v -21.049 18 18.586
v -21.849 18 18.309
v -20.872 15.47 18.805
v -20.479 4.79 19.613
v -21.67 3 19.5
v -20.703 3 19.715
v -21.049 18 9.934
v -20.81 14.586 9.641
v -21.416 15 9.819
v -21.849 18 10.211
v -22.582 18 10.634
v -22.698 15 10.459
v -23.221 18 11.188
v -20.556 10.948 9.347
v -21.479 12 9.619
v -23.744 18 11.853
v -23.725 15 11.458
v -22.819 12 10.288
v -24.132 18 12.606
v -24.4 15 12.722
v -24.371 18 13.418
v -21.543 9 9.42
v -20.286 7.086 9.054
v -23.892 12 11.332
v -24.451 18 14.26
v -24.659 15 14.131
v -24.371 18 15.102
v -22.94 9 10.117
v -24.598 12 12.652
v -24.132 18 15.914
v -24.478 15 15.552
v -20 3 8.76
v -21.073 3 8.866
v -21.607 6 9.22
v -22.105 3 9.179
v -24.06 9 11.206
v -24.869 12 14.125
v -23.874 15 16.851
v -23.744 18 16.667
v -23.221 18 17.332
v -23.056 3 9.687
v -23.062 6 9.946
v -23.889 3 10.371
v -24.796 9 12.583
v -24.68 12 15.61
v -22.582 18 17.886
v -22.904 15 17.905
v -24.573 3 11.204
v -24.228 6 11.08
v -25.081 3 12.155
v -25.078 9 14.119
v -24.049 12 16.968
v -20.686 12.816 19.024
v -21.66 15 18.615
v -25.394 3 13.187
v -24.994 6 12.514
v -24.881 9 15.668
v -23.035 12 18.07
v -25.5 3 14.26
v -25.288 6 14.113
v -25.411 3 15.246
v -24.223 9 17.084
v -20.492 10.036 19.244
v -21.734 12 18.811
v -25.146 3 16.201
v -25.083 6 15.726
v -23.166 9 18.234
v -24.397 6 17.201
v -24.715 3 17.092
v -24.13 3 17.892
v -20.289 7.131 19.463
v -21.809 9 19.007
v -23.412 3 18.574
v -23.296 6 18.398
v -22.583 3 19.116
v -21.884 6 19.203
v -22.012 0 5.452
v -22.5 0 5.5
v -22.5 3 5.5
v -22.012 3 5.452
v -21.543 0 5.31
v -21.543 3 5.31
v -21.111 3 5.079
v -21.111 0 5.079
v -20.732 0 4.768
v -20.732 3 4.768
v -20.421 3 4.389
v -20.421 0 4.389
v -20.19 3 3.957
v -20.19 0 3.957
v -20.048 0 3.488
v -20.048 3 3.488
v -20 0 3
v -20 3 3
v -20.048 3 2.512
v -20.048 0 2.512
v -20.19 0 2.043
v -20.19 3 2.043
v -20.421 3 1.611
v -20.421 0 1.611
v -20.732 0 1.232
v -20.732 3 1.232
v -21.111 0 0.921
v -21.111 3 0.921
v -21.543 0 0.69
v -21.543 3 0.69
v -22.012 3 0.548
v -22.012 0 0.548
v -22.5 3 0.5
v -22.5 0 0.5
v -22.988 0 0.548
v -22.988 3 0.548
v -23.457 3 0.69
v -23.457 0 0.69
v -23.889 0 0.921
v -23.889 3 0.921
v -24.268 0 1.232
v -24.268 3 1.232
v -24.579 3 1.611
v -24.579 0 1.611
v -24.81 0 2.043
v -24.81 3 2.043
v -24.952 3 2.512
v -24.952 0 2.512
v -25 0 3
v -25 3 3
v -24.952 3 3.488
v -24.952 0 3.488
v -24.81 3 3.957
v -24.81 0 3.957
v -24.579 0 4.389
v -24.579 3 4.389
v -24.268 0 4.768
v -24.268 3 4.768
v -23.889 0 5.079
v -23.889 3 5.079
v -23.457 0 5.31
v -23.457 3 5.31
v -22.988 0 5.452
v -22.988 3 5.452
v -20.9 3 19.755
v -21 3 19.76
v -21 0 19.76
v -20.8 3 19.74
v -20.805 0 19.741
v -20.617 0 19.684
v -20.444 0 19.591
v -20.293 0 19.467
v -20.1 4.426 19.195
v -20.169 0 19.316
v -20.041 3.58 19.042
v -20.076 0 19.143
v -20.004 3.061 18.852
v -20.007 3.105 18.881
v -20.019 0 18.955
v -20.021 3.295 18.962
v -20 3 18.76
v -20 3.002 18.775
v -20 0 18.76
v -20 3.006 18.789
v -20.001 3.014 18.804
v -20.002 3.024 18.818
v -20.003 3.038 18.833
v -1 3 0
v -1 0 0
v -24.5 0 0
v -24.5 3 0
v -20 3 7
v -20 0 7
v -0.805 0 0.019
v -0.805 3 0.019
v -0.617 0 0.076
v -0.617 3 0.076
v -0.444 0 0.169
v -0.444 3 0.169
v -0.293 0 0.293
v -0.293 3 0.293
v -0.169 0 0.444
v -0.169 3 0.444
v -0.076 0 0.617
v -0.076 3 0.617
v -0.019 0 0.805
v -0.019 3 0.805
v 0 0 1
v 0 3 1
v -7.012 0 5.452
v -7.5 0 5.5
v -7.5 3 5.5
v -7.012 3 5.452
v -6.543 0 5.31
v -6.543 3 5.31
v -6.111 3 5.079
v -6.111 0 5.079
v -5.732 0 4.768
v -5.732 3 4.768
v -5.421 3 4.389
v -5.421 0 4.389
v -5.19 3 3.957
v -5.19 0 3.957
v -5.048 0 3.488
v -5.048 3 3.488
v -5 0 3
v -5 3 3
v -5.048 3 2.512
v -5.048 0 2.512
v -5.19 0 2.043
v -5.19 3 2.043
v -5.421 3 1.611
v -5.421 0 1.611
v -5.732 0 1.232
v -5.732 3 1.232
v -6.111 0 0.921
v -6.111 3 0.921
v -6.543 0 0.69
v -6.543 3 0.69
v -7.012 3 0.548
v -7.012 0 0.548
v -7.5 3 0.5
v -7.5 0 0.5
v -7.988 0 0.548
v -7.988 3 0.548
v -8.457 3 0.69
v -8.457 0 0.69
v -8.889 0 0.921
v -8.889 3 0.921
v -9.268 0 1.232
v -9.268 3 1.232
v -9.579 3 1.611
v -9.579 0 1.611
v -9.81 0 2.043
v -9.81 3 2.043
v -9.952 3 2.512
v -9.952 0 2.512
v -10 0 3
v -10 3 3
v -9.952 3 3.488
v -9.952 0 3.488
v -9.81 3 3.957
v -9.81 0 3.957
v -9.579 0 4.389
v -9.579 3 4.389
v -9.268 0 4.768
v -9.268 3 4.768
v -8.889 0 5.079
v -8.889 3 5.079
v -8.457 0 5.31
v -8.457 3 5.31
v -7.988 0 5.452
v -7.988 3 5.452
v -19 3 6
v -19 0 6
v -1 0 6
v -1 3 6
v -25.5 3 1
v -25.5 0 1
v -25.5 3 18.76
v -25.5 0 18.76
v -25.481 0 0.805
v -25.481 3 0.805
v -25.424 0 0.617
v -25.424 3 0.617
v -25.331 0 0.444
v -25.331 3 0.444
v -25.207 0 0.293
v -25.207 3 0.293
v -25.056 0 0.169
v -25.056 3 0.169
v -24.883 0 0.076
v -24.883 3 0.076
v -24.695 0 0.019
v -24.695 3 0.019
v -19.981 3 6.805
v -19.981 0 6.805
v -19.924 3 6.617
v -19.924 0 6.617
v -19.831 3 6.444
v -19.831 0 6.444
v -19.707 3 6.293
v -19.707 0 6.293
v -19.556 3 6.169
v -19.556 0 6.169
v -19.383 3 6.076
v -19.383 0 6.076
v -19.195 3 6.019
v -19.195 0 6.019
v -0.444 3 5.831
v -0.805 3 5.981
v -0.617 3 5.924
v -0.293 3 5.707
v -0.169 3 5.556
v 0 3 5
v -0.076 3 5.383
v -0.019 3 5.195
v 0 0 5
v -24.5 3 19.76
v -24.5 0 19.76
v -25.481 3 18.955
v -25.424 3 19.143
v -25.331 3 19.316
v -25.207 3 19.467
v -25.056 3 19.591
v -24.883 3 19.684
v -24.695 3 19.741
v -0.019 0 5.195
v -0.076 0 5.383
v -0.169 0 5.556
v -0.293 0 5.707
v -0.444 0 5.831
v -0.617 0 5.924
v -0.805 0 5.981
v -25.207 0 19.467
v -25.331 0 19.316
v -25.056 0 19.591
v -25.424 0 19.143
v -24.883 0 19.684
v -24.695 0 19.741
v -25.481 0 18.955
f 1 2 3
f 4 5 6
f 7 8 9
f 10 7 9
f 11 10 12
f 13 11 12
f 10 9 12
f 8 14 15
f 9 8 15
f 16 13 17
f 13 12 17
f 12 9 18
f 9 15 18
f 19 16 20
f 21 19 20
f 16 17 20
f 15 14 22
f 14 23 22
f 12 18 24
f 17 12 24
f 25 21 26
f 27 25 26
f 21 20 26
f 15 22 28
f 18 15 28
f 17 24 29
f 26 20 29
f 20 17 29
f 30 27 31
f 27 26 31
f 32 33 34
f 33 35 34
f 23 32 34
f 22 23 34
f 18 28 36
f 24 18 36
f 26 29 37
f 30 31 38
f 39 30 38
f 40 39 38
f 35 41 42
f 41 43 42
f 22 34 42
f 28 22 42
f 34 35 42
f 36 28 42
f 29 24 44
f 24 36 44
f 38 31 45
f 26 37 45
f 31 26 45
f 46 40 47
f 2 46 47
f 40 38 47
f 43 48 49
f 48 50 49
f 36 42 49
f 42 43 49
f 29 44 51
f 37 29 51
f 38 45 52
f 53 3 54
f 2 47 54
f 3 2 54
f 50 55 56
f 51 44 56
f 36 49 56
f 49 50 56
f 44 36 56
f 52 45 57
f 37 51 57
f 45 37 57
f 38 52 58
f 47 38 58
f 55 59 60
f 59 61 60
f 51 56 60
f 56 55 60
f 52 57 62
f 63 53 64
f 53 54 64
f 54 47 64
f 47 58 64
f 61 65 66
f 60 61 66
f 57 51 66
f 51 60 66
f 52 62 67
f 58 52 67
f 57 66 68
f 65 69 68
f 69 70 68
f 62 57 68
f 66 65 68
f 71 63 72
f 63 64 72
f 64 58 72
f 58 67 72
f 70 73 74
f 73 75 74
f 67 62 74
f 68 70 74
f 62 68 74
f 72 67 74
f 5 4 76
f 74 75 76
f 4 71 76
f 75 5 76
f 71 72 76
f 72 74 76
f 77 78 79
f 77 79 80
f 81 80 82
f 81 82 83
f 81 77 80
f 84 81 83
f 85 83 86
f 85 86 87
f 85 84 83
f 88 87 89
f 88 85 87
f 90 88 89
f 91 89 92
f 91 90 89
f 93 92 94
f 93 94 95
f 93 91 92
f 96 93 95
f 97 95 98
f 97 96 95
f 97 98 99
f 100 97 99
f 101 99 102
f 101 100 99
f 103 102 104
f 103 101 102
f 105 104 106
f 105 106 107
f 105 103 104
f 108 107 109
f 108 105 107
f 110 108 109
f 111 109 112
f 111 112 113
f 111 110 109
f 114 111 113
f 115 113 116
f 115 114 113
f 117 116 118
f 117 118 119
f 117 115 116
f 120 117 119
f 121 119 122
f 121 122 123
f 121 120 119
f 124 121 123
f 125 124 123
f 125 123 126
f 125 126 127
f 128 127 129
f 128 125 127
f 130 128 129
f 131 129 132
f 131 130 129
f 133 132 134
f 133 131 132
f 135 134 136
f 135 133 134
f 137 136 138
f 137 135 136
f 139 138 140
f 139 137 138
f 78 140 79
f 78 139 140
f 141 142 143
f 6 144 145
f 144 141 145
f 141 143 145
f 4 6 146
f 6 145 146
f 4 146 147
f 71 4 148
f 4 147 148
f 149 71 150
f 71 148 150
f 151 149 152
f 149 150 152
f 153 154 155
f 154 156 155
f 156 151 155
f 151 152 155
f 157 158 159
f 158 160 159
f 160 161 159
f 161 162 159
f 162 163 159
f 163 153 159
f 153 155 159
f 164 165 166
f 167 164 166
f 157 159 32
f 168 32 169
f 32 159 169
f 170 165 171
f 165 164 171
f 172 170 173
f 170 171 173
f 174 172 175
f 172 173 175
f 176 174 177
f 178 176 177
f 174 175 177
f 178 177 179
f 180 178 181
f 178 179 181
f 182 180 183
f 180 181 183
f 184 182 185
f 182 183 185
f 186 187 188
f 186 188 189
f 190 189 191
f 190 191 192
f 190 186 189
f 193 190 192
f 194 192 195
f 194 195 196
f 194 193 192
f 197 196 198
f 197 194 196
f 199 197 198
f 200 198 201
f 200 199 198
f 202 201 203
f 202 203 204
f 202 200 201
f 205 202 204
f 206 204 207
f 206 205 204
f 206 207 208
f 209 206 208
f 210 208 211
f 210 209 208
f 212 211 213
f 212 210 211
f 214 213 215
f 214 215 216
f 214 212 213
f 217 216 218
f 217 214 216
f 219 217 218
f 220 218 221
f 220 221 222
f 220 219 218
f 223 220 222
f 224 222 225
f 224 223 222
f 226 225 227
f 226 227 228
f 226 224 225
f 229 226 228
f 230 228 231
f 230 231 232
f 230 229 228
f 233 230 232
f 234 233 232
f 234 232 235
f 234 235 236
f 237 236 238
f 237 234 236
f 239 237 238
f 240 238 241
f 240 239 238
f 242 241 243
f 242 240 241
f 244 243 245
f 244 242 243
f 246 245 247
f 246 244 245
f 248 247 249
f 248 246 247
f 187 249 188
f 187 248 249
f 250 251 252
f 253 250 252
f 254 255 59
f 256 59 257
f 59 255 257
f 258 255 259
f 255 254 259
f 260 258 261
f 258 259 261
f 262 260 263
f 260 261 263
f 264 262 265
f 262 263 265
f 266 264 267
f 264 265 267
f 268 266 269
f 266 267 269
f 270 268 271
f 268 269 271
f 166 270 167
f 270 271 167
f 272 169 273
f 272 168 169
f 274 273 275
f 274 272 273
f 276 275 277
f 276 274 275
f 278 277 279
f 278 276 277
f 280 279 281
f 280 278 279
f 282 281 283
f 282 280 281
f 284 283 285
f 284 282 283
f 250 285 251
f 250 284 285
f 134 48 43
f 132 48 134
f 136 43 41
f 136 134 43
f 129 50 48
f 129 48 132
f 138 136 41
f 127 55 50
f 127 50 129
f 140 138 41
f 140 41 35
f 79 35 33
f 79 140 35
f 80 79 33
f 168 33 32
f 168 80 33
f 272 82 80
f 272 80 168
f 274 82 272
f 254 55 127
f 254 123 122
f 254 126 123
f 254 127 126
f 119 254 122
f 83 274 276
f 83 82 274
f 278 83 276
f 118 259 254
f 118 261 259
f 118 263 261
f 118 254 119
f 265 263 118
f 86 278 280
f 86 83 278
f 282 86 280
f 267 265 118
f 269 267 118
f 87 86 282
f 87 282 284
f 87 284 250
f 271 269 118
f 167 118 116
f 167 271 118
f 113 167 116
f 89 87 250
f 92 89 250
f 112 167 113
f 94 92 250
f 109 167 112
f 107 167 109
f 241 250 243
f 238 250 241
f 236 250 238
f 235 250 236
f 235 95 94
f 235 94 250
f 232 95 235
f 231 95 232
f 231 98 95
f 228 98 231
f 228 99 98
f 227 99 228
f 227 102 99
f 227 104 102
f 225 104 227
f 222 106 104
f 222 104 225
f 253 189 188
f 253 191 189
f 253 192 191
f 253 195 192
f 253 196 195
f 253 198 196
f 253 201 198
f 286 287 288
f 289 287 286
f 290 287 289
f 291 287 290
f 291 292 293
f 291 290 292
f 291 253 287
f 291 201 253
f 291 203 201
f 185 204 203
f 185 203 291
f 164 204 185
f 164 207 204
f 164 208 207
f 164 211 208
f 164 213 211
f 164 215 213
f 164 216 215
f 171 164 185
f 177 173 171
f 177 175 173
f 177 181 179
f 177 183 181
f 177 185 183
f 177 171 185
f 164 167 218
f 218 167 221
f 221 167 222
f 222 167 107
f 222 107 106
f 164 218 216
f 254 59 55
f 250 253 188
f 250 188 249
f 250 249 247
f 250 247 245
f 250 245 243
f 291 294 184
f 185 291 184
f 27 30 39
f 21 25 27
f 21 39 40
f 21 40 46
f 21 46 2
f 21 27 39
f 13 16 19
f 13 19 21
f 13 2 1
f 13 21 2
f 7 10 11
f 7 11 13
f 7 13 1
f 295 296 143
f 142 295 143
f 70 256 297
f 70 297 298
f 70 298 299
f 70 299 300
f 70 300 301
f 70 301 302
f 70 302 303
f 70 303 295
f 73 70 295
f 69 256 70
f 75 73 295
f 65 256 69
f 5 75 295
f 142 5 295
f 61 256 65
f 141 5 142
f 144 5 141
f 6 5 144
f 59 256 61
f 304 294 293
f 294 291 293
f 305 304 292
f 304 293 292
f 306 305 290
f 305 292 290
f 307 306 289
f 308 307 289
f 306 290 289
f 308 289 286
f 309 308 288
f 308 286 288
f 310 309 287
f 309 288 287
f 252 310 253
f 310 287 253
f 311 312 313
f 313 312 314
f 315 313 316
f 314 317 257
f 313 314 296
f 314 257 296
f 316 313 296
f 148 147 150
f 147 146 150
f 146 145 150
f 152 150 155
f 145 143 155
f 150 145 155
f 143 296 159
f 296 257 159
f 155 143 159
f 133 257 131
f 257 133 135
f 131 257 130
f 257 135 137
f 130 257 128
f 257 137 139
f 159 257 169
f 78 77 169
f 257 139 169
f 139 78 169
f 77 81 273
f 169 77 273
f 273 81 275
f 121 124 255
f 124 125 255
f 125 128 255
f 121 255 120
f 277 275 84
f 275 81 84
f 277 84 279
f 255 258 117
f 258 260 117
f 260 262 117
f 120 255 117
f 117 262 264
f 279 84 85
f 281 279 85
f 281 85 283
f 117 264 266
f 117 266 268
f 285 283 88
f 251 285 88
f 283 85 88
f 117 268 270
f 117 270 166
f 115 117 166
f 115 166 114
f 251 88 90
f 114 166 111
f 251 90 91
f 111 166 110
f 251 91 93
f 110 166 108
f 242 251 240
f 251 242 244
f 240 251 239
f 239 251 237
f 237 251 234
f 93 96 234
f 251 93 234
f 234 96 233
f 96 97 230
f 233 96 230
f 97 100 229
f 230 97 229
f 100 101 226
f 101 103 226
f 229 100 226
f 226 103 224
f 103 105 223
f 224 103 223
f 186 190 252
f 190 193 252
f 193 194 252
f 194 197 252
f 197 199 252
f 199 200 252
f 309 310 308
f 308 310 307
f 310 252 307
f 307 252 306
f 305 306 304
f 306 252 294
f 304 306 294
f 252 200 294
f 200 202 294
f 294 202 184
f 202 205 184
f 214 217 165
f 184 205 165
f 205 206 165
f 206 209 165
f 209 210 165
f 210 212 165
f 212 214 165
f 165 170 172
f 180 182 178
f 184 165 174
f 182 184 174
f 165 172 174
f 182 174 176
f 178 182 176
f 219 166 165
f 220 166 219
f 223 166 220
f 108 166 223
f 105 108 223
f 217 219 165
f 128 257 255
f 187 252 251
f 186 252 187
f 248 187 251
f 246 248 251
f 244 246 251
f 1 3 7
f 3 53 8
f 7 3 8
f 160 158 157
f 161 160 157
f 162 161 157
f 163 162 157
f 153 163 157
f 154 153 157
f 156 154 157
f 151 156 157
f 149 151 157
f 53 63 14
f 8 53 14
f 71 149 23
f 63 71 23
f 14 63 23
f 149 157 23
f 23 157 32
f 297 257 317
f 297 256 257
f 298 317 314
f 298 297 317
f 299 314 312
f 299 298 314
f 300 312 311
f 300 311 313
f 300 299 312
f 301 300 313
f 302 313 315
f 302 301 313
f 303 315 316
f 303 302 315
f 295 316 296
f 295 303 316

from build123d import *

# Parameters (mm, degrees)
SKETCH1_R           = 2.5
BOSS_EXTRUDE1_DEPTH = 3
BOSS_EXTRUDE2_DEPTH = 15
BOSS_EXTRUDE2_DRAFT = 4
FILLET2_R           = 1
FILLET3_R           = 1
FILLET4_R           = 1
FILLET5_R           = 1
FILLET6_R           = 1
FILLET7_R           = 1


with BuildPart() as part:
    # Sketch1 → Boss-Extrude1 (new body)
    with BuildSketch(Plane(origin=(0, 0, 0), x_dir=(1, 0, 0), z_dir=(0, 1, 0))):
        Polygon((0, 0), (-25.5, 0), (-25.5, -19.76), (-20, -19.76), (-20, -6), (0, -6), align=None)
        with Locations(Location((-7.5, -3, 0), (0, 0, 270))):
            Circle(SKETCH1_R, mode=Mode.SUBTRACT)
        with Locations(Location((-22.5, -3, 0), (0, 0, 270))):
            Circle(SKETCH1_R, mode=Mode.SUBTRACT)
    extrude(amount=BOSS_EXTRUDE1_DEPTH)


with BuildPart() as boss_extrude2_tool:
    # Sketch3 → Boss-Extrude2 (with draft: the straight prism first)
    with BuildSketch(Plane(origin=(0, 3, 0), x_dir=(1, 0, 0), z_dir=(0, 1, 0))):
        with BuildLine():
            ThreePointArc((-20, -8.76), (-25.5, -14.26), (-20, -19.76))
            Line((-20, -19.76), (-20, -8.76))
        make_face()
    extrude(amount=BOSS_EXTRUDE2_DEPTH)
    # Boss-Extrude2: the draft: its side faces are tilted about the plane it starts from
    boss_extrude2_sides = [boss_extrude2_tool.faces().sort_by_distance(p)[0] for p in [
        (-25.5, 10.5, 14.26),
        (-20, 10.5, 14.26),
    ]]
    draft(boss_extrude2_sides, Plane(origin=(0, 3, 0), x_dir=(1, 0, 0), z_dir=(0, 1, 0)), BOSS_EXTRUDE2_DRAFT)


with BuildPart() as part_1:
    add(part.part)

    # Boss-Extrude2: add boss_extrude2_tool
    add(boss_extrude2_tool.part)

    # Fillet2
    fillet2_edges = [part_1.edges().sort_by_distance(p)[0] for p in [
        (-20, 1.5, 6),
    ]]
    fillet(fillet2_edges, radius=FILLET2_R)

    # Fillet3
    # the kernel refuses this fillet: 1 mm, written as the material it takes off along each edge
    with BuildSketch(Plane(origin=(-20, -6, 19.76), x_dir=(0, 0, -1), z_dir=(0, 1, 0))) as fillet3_piece_1:
        with BuildLine():
            CenterArc((FILLET3_R, FILLET3_R), FILLET3_R, 180, 90)
            Line((0, FILLET3_R), (-FILLET3_R * 0.02, FILLET3_R))
            Line((-FILLET3_R * 0.02, FILLET3_R), (-FILLET3_R * 0.02, -FILLET3_R * 0.02))
            Line((-FILLET3_R * 0.02, -FILLET3_R * 0.02), (FILLET3_R, -FILLET3_R * 0.02))
            Line((FILLET3_R, -FILLET3_R * 0.02), (FILLET3_R, 0))
        make_face()
    extrude(amount=15, mode=Mode.SUBTRACT)

    # Fillet4
    fillet4_edges = [part_1.edges().sort_by_distance(p)[0] for p in [
        (-25.5, 1.5, 19.76),
    ]]
    fillet(fillet4_edges, radius=FILLET4_R)

    # Fillet5
    fillet5_edges = [part_1.edges().sort_by_distance(p)[0] for p in [
        (-25.5, 1.5, 0),
    ]]
    fillet(fillet5_edges, radius=FILLET5_R)

    # Fillet6
    fillet6_edges = [part_1.edges().sort_by_distance(p)[0] for p in [
        (0, 1.5, 0),
    ]]
    fillet(fillet6_edges, radius=FILLET6_R)

    # Fillet7
    fillet7_edges = [part_1.edges().sort_by_distance(p)[0] for p in [
        (0, 1.5, 6),
    ]]
    fillet(fillet7_edges, radius=FILLET7_R)


solid = part_1.part
